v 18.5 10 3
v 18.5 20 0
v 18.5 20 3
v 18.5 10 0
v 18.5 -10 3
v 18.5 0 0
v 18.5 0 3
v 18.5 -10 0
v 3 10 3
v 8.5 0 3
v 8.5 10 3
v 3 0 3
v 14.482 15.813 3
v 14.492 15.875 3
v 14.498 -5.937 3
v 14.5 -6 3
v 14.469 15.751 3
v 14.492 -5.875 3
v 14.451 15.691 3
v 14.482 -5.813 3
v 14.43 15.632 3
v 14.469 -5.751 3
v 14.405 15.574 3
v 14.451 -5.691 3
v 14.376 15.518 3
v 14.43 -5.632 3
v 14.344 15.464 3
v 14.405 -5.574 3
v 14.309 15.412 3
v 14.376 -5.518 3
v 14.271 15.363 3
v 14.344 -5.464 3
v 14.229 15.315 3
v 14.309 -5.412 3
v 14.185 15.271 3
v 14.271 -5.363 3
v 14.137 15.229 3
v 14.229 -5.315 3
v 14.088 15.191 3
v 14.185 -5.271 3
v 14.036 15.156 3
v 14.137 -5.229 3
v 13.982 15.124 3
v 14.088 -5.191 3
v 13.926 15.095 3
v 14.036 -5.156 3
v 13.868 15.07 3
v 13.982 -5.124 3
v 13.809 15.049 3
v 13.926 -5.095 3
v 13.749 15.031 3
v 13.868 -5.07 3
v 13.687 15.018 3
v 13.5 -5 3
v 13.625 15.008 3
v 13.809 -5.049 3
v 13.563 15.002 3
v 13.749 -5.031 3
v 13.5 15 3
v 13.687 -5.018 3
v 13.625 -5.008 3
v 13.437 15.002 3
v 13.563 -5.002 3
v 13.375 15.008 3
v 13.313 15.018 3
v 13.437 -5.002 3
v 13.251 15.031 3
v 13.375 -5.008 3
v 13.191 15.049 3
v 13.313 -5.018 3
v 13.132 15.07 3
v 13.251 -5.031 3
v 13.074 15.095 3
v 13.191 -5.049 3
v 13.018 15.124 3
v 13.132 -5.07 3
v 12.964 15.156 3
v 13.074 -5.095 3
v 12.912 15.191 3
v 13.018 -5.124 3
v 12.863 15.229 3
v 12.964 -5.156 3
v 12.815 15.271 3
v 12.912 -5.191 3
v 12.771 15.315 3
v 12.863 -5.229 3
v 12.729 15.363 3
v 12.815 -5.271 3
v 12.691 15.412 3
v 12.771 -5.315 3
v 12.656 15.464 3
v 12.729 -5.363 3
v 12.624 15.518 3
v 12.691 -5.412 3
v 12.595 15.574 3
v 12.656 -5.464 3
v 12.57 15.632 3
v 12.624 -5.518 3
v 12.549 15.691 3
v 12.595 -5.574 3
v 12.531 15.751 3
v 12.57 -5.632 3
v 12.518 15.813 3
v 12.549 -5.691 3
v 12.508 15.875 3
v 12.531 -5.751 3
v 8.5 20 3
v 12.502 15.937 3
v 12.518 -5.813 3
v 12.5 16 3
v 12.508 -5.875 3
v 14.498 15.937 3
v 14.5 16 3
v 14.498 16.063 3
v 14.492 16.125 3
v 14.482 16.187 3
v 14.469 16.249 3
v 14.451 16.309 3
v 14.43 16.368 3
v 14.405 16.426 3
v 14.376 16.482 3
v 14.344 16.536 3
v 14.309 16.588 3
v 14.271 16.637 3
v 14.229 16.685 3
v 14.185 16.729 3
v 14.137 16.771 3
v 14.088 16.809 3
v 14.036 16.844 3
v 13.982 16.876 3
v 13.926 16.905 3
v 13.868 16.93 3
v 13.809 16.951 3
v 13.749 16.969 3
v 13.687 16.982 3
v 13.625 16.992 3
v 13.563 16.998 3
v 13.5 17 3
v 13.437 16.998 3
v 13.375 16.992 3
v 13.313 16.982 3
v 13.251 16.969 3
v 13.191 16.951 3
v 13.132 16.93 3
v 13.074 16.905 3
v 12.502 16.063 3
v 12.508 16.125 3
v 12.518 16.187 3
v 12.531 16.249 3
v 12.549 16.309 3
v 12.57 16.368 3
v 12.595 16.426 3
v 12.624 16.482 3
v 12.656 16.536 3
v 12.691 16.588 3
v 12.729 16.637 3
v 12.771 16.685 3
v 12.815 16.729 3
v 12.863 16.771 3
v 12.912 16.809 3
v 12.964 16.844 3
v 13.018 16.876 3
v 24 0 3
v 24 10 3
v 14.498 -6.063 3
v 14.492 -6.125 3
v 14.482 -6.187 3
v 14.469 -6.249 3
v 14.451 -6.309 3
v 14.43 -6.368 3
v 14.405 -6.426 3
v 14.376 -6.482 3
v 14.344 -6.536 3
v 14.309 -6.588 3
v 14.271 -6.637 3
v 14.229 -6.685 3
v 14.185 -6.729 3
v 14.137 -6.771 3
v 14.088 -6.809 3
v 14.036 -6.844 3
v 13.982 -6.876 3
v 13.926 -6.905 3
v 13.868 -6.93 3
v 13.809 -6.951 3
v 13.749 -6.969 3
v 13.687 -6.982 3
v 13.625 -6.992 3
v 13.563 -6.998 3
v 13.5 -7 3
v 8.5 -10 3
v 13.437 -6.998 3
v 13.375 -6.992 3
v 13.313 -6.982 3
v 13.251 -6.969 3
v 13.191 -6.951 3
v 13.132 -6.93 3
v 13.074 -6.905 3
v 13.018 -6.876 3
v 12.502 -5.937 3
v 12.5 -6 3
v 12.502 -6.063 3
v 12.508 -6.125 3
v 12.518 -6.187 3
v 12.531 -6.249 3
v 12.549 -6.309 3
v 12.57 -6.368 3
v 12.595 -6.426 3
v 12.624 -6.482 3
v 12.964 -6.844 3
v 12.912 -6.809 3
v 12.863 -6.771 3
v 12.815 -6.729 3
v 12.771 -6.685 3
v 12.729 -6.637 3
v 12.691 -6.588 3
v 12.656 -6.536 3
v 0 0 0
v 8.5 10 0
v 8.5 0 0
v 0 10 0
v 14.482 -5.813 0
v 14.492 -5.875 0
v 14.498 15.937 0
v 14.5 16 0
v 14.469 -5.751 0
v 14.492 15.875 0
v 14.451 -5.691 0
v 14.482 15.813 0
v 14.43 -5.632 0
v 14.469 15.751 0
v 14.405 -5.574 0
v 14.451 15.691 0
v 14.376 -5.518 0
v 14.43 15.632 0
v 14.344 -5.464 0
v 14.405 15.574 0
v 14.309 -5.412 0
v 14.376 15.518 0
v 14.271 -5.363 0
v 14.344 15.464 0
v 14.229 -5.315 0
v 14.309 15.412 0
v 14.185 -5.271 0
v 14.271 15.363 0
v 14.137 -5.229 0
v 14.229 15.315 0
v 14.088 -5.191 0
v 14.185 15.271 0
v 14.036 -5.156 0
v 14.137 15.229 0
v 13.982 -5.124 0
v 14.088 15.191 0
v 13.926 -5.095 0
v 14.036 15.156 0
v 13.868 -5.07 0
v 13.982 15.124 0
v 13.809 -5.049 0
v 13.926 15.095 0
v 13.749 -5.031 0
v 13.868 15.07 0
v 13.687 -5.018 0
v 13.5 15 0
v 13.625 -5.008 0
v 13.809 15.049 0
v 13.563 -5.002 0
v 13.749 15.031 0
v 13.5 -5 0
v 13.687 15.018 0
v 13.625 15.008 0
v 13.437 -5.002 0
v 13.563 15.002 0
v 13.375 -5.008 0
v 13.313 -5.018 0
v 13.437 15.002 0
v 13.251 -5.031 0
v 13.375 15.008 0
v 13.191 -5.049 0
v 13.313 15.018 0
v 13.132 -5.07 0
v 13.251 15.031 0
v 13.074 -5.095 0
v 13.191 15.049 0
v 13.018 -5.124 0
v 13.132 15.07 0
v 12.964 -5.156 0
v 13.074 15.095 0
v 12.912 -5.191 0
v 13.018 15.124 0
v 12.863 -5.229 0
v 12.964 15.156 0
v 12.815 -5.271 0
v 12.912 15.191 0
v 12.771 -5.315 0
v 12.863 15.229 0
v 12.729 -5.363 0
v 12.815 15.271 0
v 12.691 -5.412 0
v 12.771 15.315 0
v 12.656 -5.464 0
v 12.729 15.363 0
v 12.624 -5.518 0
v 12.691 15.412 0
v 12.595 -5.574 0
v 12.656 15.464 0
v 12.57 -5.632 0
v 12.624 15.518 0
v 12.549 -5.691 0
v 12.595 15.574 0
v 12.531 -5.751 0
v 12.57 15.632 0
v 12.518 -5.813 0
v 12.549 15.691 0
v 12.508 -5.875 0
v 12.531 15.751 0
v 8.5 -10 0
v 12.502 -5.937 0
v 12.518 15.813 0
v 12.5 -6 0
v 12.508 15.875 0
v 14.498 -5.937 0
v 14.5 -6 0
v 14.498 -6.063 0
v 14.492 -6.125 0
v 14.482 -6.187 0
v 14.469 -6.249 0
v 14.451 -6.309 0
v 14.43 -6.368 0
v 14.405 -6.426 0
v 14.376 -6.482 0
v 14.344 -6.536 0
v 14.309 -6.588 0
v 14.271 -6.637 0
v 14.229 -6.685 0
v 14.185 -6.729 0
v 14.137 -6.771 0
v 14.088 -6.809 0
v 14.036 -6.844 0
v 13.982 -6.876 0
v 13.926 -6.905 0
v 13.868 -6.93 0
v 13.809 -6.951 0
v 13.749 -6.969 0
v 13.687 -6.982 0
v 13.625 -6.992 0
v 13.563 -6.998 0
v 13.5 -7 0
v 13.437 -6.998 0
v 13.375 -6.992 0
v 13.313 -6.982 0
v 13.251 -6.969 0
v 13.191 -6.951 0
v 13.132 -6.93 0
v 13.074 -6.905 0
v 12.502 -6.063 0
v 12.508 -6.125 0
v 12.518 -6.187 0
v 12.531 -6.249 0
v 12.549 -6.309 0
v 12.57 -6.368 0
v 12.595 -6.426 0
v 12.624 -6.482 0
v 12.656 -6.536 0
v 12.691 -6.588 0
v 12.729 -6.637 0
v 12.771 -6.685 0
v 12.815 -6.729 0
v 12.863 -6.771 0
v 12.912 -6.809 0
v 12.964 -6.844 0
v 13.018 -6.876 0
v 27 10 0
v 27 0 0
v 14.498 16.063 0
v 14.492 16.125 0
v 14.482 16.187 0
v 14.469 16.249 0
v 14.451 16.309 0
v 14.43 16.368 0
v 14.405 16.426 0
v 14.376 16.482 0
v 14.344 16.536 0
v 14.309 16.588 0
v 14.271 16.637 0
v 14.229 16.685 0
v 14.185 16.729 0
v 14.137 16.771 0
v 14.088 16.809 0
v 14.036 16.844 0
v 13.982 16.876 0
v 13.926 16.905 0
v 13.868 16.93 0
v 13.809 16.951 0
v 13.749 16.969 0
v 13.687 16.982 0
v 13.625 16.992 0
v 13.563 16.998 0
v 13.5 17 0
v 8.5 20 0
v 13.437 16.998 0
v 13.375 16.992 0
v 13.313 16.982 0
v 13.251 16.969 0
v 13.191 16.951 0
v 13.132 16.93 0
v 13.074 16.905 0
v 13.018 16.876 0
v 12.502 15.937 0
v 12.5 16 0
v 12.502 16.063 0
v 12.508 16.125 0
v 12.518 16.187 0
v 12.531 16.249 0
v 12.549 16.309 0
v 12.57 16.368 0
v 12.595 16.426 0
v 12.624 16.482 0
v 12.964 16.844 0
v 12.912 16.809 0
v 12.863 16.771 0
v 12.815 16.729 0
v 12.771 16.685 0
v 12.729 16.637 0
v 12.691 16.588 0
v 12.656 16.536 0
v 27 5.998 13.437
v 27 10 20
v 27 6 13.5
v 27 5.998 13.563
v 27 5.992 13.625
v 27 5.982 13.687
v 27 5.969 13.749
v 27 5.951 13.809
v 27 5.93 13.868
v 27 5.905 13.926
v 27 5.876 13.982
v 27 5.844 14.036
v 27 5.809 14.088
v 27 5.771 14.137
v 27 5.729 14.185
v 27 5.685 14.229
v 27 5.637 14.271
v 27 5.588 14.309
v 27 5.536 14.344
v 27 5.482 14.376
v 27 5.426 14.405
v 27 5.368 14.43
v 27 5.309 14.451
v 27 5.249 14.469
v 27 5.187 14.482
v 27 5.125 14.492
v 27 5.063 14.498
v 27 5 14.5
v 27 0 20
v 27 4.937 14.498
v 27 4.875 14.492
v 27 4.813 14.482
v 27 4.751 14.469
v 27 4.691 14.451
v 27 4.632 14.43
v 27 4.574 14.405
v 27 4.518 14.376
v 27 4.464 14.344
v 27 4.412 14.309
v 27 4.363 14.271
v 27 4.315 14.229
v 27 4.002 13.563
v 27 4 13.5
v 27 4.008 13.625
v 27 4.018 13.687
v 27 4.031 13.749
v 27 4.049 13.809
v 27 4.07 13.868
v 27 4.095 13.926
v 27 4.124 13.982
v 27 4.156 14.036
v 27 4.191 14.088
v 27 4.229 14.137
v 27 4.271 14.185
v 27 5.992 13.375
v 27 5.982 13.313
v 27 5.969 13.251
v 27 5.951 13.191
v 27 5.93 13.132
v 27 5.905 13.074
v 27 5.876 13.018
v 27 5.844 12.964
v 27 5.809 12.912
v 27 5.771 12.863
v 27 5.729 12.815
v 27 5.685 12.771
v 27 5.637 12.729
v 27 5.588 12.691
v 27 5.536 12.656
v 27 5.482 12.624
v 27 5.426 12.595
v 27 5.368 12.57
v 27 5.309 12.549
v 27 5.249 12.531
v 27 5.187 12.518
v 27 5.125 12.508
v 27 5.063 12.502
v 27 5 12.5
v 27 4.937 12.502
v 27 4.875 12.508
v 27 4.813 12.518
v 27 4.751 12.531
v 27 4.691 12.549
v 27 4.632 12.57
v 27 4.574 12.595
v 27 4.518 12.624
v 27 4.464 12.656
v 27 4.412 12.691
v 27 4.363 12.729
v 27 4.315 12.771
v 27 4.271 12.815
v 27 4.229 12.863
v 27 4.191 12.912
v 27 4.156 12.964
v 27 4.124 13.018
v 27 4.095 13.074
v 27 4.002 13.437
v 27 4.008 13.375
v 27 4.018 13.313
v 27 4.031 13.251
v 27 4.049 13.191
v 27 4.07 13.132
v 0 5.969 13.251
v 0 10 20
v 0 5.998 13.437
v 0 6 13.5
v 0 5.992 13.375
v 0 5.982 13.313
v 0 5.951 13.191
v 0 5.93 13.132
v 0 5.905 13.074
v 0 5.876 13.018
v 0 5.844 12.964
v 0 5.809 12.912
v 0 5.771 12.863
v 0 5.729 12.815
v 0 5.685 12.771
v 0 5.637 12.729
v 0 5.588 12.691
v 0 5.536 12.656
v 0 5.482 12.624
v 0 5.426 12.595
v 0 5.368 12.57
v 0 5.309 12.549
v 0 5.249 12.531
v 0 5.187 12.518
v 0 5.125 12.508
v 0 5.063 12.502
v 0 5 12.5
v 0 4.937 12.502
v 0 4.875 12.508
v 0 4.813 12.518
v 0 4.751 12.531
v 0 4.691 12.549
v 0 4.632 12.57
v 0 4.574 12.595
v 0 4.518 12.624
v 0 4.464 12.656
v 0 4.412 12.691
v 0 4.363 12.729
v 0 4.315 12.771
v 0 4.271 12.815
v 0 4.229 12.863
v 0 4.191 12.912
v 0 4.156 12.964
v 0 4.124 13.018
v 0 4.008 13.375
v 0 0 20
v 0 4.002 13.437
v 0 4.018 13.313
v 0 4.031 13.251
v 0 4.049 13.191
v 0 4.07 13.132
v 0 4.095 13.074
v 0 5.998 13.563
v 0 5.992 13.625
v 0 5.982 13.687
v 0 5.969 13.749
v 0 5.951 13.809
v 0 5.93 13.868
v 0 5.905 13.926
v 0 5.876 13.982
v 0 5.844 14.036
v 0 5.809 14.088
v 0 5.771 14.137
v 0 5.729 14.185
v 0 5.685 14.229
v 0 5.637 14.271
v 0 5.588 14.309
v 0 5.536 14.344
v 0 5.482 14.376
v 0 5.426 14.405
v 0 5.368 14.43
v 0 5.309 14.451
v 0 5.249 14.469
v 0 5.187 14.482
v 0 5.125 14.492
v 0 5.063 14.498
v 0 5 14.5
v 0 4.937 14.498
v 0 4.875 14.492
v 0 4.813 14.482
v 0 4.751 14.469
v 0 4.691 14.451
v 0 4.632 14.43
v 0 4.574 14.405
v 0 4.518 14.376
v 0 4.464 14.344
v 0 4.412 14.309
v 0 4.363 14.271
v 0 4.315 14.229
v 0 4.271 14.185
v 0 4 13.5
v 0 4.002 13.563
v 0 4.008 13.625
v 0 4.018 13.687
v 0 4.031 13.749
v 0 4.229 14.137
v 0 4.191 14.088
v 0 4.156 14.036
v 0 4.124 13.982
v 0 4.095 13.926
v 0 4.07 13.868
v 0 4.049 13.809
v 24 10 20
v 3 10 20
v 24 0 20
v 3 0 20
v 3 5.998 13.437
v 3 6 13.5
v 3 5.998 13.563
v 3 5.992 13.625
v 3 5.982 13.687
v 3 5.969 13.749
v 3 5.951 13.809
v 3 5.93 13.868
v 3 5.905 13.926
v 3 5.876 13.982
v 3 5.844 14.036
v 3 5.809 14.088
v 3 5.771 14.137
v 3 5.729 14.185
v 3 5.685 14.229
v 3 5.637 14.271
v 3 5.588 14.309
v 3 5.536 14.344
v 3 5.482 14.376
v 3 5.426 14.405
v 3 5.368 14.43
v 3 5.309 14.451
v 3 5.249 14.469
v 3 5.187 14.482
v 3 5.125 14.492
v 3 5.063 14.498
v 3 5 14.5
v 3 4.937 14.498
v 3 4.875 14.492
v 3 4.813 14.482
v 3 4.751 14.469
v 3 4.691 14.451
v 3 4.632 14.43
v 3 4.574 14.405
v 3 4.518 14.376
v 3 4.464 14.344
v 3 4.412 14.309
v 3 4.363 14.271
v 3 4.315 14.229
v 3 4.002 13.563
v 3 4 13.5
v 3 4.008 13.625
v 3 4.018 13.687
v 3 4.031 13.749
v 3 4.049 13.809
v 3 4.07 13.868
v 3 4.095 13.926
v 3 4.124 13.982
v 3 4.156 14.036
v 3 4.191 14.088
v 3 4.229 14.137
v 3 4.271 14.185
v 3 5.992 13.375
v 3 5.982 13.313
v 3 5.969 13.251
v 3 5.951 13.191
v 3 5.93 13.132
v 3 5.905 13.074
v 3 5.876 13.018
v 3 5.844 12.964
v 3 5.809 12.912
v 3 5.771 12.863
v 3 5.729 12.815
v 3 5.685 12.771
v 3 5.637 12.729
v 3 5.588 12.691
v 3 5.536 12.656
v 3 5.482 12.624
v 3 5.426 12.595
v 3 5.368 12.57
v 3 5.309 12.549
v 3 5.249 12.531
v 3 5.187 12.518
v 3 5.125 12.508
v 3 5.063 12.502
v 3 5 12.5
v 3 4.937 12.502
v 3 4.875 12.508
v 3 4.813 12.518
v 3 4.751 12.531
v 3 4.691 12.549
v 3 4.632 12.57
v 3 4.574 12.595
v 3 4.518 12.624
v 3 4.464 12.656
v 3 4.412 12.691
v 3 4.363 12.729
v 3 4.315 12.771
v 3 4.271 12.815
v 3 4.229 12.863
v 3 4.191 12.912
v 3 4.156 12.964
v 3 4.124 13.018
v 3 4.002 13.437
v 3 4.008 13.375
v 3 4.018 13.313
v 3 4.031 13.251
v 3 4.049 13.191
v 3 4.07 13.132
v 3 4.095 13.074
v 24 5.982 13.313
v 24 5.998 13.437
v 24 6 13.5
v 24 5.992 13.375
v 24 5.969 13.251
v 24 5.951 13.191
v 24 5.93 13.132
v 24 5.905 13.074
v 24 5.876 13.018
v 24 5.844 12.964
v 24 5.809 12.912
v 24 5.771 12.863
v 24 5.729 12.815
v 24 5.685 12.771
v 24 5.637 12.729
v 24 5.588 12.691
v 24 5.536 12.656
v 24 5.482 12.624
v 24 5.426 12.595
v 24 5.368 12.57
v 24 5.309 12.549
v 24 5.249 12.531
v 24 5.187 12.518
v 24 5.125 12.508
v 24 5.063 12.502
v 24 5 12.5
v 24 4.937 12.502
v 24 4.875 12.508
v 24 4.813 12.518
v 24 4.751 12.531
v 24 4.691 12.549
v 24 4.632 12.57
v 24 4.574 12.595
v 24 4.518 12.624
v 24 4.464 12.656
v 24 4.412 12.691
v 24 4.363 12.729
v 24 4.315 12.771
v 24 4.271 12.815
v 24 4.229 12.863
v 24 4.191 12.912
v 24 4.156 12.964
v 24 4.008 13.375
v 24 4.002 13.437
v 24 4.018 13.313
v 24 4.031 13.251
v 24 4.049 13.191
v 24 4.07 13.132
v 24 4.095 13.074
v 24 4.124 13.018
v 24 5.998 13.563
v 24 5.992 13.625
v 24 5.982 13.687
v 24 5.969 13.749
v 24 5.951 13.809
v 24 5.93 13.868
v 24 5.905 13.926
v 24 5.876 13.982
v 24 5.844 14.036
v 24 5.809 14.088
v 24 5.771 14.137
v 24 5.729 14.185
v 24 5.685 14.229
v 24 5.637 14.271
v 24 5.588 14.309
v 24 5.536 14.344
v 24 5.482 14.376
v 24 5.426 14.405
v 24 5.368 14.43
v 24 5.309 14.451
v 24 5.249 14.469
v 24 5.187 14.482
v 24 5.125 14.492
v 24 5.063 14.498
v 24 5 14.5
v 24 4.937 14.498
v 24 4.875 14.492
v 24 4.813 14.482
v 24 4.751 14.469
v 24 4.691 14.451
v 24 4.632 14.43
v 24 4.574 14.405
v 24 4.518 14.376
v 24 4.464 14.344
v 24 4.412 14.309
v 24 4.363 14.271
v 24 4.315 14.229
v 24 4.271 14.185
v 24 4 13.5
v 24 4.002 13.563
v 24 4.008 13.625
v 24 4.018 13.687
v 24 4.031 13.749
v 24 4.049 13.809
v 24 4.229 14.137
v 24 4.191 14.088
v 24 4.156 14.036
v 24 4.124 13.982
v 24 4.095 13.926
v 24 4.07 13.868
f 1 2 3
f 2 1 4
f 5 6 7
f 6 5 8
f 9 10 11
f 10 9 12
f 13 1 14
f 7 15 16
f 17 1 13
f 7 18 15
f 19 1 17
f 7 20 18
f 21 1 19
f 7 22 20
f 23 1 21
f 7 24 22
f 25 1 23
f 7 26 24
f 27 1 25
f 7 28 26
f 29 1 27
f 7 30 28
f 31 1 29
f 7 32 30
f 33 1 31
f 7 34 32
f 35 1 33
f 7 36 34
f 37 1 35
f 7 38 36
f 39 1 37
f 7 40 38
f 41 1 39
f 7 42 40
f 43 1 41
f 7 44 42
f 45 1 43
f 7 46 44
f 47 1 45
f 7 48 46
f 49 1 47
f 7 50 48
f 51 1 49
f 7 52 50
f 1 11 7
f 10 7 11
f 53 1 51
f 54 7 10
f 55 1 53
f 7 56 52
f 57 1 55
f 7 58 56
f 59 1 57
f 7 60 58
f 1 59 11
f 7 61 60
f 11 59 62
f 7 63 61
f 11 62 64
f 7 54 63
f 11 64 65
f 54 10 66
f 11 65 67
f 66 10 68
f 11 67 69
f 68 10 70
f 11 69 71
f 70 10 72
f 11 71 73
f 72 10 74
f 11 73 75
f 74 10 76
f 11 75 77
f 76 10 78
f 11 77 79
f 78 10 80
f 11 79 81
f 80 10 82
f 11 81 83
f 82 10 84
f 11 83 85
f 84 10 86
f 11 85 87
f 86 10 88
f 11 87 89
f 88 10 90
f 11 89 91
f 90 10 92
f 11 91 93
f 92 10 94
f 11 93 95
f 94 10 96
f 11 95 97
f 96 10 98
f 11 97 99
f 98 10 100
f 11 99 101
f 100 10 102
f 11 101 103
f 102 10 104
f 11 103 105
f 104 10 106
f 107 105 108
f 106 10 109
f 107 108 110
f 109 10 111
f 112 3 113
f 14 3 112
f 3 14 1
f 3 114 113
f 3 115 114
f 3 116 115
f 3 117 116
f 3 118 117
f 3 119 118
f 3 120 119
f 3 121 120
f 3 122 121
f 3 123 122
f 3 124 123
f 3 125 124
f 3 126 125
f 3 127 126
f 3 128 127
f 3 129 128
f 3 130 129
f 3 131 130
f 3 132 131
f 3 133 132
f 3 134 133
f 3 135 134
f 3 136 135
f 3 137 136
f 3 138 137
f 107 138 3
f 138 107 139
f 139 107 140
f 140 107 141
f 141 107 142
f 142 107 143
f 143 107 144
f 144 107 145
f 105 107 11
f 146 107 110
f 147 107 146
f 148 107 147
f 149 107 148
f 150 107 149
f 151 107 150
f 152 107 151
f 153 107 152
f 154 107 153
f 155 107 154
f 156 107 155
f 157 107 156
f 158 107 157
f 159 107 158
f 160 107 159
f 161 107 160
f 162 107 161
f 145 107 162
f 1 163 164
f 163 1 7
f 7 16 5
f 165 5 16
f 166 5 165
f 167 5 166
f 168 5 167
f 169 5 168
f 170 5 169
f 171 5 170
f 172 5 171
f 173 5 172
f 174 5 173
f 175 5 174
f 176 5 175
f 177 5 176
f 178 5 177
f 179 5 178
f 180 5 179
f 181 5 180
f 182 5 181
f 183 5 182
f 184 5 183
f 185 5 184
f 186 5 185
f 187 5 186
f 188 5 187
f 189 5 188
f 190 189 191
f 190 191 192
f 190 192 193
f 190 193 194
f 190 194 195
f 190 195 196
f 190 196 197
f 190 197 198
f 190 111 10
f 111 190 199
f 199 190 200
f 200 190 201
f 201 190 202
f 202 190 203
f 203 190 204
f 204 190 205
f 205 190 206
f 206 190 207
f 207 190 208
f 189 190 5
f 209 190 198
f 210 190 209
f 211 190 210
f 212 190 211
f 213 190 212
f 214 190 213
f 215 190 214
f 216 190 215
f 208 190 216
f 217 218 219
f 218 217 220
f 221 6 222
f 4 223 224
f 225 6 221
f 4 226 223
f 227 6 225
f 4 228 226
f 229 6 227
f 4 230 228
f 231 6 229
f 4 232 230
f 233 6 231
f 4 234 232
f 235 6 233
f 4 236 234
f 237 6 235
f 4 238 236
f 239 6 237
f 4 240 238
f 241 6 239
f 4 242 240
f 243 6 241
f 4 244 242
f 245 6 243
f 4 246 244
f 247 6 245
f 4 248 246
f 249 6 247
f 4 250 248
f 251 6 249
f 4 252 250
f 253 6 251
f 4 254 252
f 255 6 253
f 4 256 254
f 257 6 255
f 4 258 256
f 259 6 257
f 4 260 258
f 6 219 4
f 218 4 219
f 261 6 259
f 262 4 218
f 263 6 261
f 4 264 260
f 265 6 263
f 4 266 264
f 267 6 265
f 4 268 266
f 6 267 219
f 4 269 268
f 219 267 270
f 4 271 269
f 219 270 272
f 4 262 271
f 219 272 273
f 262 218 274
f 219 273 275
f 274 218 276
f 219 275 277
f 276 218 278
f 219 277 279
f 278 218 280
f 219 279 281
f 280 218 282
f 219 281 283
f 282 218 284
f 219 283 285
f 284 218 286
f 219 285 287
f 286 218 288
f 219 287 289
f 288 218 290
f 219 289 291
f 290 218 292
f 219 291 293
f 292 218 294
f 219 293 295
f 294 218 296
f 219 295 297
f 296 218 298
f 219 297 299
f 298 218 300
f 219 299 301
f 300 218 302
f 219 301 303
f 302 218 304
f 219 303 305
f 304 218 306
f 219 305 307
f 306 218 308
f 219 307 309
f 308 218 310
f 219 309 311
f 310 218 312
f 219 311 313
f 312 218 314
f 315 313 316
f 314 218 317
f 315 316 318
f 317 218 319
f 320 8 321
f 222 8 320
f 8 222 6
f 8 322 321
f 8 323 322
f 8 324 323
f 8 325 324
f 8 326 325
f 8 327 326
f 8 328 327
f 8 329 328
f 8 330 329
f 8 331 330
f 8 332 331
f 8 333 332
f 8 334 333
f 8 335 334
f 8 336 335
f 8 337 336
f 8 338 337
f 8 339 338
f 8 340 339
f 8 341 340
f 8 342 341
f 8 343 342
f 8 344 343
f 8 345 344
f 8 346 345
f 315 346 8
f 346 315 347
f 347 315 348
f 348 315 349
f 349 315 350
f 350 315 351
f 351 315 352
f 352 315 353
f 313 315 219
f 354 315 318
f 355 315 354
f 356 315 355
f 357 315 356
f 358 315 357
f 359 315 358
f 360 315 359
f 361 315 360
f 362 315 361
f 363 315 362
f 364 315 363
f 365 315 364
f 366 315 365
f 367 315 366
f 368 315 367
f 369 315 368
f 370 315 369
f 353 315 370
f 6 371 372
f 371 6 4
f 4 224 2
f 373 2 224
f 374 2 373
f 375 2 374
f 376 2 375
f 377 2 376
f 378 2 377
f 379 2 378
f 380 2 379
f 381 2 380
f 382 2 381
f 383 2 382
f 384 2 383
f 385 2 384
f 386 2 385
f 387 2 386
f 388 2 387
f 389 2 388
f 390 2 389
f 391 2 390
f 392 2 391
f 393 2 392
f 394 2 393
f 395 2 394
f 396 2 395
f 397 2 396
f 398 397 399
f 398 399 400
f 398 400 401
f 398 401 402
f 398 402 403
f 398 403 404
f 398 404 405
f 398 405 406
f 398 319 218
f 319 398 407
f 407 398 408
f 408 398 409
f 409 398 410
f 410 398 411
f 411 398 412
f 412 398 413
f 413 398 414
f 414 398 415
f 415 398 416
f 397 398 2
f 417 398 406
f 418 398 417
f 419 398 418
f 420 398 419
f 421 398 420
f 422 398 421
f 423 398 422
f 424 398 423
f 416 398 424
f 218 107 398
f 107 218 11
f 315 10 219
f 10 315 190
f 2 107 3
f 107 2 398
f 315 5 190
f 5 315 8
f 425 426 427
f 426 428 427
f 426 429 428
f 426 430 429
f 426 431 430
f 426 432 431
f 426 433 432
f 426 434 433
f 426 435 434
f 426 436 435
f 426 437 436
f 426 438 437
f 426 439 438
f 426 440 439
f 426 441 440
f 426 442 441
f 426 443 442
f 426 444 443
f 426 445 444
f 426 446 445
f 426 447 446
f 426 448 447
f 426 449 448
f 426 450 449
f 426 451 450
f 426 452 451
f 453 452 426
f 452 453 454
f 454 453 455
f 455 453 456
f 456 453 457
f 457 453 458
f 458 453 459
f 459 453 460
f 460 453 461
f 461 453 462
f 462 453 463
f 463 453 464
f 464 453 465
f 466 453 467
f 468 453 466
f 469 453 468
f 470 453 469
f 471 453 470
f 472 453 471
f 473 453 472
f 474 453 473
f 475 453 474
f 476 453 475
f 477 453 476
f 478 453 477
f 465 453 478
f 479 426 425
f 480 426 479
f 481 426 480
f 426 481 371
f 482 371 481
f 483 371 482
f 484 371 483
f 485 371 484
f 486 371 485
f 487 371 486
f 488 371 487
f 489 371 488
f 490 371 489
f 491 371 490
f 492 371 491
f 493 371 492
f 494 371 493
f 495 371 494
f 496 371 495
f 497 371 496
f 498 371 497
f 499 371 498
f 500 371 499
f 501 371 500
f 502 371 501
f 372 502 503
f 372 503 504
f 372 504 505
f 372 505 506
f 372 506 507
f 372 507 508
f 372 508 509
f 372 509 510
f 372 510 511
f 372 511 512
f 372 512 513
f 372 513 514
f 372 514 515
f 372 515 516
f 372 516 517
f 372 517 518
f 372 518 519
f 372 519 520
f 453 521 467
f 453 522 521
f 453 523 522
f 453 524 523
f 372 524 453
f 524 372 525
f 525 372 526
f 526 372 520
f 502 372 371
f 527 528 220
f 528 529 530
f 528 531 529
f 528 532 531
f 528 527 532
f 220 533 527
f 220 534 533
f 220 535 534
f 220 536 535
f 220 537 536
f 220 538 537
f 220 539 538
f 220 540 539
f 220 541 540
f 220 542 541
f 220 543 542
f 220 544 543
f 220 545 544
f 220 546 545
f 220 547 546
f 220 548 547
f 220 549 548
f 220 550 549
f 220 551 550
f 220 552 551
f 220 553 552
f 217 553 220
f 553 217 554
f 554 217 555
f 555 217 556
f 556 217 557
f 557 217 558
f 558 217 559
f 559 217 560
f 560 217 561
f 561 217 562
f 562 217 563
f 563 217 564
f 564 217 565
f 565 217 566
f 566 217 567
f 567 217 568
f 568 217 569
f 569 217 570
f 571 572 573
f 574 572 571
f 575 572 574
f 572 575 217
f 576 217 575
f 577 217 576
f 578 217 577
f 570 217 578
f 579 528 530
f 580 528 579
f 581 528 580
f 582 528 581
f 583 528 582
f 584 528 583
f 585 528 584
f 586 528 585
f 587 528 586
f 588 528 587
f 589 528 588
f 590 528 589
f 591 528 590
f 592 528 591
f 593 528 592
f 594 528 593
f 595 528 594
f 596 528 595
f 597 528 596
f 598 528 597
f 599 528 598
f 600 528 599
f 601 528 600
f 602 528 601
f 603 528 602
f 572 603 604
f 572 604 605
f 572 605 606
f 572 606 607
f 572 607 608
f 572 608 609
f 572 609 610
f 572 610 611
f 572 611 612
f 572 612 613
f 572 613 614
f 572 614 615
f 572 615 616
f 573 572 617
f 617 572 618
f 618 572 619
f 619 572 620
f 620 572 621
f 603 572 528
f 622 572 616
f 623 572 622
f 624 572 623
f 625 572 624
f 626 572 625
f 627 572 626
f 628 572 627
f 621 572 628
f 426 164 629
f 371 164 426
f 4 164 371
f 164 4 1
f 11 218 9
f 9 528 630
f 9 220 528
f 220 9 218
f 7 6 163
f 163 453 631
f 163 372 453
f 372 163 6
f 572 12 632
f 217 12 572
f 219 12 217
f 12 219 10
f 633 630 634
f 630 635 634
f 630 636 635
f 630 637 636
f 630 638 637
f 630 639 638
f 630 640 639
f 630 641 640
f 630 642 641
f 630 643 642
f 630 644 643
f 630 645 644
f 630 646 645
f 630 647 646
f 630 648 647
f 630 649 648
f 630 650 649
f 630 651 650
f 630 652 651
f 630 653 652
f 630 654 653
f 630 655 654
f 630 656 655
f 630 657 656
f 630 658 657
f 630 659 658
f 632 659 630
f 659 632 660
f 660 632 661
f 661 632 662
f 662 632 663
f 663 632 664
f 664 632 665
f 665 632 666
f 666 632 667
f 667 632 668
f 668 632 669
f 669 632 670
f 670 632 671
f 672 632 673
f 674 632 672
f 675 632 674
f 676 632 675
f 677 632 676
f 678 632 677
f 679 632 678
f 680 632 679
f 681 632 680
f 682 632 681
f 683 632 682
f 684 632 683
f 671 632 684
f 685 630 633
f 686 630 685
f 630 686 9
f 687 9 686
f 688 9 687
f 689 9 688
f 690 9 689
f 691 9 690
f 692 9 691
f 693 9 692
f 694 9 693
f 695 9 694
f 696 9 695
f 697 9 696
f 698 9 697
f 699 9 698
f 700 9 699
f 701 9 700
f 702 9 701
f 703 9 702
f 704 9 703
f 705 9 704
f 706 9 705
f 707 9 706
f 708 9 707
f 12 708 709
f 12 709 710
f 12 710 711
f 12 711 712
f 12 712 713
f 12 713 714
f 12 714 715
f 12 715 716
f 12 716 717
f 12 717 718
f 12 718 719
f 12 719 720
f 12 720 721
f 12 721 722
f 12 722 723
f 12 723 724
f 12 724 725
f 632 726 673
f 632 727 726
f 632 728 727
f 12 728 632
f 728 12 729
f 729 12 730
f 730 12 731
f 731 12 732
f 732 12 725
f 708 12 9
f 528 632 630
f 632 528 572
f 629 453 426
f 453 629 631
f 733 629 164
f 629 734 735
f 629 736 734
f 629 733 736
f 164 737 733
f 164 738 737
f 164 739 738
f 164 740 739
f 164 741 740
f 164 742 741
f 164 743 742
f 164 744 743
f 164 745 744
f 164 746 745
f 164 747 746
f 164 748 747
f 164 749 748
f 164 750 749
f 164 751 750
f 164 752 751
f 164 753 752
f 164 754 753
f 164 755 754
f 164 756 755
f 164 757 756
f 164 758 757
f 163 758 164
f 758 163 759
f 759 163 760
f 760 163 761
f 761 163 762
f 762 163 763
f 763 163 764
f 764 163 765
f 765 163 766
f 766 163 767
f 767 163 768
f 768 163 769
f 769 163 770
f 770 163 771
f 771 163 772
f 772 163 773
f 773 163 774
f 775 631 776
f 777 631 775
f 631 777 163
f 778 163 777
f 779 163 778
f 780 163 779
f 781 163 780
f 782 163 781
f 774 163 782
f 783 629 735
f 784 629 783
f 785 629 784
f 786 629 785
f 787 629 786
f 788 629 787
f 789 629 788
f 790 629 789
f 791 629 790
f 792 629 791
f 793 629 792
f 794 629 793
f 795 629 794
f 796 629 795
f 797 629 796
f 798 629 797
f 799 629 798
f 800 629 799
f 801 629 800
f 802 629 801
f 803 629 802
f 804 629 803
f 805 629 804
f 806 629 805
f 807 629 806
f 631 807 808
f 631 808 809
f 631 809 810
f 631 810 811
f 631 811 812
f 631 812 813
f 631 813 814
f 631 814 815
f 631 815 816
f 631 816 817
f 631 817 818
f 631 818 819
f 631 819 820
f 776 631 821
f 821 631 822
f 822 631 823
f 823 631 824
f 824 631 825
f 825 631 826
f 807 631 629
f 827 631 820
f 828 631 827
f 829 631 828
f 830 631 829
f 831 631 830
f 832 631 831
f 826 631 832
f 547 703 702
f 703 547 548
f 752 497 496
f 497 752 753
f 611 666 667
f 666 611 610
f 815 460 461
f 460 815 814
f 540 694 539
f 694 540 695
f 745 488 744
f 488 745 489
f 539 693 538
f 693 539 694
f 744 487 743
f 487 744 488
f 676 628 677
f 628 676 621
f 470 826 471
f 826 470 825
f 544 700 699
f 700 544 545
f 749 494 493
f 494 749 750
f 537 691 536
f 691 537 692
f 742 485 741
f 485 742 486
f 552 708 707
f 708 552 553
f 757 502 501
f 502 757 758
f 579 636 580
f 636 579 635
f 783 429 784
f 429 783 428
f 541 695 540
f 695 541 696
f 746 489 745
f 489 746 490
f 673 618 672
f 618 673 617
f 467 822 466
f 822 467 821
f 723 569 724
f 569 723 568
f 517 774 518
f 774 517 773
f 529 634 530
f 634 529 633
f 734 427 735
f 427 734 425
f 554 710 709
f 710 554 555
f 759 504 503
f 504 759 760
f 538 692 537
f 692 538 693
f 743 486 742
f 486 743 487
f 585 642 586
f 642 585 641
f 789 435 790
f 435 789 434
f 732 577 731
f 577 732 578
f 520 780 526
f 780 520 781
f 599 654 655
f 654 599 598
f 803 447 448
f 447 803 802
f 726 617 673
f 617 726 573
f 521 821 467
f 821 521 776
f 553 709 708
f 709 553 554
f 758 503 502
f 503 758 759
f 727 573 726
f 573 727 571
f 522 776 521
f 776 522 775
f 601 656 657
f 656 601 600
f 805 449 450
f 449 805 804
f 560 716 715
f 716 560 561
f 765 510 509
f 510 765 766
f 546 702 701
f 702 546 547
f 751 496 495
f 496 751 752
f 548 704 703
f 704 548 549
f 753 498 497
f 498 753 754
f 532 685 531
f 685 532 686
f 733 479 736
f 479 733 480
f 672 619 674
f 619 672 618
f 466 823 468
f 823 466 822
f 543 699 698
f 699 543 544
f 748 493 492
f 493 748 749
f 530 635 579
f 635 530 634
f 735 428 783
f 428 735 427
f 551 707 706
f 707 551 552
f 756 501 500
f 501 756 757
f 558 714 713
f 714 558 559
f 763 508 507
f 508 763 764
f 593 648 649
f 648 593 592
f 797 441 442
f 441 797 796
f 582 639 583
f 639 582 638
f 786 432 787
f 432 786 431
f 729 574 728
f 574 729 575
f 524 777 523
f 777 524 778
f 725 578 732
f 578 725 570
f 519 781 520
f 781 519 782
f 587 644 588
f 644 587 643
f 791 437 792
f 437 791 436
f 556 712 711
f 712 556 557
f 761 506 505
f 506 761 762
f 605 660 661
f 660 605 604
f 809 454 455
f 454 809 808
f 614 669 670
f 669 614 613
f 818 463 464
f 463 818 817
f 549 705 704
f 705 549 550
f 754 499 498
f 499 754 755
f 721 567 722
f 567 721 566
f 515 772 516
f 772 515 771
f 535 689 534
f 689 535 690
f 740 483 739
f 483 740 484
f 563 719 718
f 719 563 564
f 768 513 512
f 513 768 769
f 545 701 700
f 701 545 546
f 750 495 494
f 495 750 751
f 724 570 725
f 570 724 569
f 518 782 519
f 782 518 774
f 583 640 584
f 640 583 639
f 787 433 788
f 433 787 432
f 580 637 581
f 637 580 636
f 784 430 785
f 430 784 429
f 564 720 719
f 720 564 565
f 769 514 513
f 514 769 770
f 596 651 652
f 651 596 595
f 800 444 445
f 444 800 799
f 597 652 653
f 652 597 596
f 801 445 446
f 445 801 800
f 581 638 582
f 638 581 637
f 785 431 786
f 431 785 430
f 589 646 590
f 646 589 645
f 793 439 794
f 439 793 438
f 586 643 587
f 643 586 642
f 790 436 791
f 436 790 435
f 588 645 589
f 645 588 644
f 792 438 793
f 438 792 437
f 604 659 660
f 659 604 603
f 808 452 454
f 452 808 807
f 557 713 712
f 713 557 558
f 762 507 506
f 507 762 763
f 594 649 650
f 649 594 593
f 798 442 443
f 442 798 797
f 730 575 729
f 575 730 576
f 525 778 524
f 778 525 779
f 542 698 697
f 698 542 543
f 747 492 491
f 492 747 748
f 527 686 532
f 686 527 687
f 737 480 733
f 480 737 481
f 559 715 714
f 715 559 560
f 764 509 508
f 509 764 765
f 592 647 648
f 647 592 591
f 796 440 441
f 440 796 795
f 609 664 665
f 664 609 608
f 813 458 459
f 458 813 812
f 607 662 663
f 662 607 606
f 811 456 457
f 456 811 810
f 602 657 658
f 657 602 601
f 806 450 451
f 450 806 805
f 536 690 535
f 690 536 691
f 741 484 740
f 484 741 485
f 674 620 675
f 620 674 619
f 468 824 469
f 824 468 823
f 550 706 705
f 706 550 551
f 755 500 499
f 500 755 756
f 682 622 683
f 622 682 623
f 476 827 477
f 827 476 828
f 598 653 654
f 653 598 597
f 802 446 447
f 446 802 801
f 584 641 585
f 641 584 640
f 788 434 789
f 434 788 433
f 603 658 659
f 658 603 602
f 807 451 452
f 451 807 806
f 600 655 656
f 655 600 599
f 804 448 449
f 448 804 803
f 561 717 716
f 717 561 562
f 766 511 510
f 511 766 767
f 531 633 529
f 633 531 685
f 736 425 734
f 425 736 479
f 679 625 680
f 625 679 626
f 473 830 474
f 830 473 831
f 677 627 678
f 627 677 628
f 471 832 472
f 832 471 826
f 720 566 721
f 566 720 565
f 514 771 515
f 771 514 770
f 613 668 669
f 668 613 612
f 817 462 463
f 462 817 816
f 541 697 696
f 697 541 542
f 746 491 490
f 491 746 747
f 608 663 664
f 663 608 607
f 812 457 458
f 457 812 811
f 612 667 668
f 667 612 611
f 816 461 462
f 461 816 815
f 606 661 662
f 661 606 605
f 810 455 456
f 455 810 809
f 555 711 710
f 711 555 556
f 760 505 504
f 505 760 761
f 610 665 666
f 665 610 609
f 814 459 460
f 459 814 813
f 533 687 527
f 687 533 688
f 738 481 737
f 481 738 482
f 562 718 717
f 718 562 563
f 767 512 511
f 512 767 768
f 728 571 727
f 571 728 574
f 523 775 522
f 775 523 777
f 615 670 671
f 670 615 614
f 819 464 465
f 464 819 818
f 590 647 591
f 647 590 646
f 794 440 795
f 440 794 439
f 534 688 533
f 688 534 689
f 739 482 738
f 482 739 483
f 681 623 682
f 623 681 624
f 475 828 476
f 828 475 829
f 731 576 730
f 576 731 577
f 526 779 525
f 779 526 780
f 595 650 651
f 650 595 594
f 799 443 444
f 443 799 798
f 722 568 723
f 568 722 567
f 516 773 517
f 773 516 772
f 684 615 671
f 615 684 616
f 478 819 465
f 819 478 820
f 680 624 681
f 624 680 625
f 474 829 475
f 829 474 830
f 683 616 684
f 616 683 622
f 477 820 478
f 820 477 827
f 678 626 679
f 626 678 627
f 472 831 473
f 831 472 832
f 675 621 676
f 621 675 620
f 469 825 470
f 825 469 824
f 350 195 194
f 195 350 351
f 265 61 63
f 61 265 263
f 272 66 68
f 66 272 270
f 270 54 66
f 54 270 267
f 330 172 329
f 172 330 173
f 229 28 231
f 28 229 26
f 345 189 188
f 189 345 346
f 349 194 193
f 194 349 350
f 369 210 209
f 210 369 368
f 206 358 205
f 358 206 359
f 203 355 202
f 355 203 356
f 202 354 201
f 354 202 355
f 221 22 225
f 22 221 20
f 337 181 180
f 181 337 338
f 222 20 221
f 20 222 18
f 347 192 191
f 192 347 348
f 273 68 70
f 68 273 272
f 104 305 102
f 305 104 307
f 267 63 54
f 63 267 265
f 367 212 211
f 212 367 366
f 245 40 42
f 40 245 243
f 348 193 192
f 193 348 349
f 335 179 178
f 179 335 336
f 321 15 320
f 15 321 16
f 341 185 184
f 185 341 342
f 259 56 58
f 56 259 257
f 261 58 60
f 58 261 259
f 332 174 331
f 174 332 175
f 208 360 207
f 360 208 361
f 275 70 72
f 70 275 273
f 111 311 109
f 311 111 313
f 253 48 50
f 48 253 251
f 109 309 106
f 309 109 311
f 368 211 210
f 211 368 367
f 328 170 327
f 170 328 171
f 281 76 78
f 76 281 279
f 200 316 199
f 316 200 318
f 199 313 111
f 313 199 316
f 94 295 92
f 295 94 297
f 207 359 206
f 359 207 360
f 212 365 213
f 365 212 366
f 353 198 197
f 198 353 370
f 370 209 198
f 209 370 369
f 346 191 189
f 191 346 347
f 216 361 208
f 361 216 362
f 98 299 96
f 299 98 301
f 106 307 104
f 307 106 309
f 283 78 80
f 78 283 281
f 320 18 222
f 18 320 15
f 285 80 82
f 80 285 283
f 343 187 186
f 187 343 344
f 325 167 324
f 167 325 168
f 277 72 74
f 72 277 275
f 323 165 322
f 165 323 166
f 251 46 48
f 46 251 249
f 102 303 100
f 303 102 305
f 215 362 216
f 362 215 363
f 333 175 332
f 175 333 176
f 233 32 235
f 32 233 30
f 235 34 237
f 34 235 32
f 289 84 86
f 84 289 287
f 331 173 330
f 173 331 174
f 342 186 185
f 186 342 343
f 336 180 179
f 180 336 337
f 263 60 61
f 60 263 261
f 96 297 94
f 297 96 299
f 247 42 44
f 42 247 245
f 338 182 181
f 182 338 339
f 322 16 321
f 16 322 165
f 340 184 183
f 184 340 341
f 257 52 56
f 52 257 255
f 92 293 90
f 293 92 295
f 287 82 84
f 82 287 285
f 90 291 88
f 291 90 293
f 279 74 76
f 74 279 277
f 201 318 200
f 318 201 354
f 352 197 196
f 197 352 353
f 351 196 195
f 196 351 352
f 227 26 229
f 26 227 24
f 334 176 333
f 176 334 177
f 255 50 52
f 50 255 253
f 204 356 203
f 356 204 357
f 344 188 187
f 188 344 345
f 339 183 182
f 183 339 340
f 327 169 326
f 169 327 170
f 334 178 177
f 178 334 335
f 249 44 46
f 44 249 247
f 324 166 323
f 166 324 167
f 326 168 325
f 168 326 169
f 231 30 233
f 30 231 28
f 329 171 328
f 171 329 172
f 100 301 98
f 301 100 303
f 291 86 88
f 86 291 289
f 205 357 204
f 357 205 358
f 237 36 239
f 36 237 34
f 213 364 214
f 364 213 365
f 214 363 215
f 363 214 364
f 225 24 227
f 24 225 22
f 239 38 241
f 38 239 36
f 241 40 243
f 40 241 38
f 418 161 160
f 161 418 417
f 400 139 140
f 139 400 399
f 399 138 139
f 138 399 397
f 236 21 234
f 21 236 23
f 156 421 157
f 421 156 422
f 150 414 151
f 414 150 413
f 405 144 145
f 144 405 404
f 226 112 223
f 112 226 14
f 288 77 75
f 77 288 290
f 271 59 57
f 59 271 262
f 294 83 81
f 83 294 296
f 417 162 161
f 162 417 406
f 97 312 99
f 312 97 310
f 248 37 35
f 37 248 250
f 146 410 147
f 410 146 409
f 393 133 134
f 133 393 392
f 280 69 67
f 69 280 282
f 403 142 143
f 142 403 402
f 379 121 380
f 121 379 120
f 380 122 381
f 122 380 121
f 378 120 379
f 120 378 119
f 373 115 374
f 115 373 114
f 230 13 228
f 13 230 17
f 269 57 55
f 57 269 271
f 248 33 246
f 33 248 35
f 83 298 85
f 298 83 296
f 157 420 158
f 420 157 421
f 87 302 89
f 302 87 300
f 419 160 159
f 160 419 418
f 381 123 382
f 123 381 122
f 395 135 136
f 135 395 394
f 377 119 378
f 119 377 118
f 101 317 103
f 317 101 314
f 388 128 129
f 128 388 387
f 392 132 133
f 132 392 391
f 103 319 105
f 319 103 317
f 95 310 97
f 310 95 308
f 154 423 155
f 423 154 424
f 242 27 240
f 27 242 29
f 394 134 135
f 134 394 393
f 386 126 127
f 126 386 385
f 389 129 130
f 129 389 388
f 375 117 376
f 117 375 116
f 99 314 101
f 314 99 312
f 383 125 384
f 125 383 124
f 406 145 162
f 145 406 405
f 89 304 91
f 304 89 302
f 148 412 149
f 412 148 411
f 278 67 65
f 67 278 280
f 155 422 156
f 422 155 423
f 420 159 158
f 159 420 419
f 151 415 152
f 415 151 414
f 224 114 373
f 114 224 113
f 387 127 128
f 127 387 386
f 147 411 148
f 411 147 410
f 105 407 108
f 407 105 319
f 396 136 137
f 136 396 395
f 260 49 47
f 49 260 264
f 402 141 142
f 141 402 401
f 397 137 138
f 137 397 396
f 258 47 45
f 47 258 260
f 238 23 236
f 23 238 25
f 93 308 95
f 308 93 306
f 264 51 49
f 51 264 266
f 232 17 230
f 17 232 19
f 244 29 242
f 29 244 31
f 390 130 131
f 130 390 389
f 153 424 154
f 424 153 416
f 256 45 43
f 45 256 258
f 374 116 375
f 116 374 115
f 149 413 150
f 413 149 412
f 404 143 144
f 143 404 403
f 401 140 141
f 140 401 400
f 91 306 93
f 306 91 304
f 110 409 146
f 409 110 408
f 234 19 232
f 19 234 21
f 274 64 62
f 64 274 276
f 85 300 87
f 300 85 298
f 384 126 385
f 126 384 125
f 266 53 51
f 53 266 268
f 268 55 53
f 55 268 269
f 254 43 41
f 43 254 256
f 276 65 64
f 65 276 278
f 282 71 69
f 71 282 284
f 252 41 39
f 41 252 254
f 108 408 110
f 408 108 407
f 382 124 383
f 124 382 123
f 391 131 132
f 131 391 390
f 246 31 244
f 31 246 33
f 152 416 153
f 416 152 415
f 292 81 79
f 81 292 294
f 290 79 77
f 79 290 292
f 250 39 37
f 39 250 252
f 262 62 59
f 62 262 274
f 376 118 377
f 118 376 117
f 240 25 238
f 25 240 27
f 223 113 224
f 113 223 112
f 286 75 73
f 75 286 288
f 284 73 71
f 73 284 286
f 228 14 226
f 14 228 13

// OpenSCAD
difference(){
	union(){
        translate([8.5,-10,0]){
           cube([10,30,3], center=false);
        }	   

        translate([0,0,0]){
           cube([27,10,3], center=false);
        }	   
        translate([0,0,0]){
           cube([3,10,20], center=false);
        }	   
        translate([24,0,0]){
           cube([3,10,20], center=false);
        }	   

 
	}
	union() {

       translate([0,5,13.5]){
            rotate(a = [0,90,0]) {
                cylinder(h=600, r=1.0, $fn=100, center=true);
            }
       }   
       translate([13.5,-6,0]){
            rotate(a = [0,0,90]) {
                cylinder(h=600, r=1.0, $fn=100, center=true);
            }
       }   
       translate([13.5,16,0]){
            rotate(a = [0,0,90]) {
                cylinder(h=600, r=1.0, $fn=100, center=true);
            }
       }   

        
	}
}
